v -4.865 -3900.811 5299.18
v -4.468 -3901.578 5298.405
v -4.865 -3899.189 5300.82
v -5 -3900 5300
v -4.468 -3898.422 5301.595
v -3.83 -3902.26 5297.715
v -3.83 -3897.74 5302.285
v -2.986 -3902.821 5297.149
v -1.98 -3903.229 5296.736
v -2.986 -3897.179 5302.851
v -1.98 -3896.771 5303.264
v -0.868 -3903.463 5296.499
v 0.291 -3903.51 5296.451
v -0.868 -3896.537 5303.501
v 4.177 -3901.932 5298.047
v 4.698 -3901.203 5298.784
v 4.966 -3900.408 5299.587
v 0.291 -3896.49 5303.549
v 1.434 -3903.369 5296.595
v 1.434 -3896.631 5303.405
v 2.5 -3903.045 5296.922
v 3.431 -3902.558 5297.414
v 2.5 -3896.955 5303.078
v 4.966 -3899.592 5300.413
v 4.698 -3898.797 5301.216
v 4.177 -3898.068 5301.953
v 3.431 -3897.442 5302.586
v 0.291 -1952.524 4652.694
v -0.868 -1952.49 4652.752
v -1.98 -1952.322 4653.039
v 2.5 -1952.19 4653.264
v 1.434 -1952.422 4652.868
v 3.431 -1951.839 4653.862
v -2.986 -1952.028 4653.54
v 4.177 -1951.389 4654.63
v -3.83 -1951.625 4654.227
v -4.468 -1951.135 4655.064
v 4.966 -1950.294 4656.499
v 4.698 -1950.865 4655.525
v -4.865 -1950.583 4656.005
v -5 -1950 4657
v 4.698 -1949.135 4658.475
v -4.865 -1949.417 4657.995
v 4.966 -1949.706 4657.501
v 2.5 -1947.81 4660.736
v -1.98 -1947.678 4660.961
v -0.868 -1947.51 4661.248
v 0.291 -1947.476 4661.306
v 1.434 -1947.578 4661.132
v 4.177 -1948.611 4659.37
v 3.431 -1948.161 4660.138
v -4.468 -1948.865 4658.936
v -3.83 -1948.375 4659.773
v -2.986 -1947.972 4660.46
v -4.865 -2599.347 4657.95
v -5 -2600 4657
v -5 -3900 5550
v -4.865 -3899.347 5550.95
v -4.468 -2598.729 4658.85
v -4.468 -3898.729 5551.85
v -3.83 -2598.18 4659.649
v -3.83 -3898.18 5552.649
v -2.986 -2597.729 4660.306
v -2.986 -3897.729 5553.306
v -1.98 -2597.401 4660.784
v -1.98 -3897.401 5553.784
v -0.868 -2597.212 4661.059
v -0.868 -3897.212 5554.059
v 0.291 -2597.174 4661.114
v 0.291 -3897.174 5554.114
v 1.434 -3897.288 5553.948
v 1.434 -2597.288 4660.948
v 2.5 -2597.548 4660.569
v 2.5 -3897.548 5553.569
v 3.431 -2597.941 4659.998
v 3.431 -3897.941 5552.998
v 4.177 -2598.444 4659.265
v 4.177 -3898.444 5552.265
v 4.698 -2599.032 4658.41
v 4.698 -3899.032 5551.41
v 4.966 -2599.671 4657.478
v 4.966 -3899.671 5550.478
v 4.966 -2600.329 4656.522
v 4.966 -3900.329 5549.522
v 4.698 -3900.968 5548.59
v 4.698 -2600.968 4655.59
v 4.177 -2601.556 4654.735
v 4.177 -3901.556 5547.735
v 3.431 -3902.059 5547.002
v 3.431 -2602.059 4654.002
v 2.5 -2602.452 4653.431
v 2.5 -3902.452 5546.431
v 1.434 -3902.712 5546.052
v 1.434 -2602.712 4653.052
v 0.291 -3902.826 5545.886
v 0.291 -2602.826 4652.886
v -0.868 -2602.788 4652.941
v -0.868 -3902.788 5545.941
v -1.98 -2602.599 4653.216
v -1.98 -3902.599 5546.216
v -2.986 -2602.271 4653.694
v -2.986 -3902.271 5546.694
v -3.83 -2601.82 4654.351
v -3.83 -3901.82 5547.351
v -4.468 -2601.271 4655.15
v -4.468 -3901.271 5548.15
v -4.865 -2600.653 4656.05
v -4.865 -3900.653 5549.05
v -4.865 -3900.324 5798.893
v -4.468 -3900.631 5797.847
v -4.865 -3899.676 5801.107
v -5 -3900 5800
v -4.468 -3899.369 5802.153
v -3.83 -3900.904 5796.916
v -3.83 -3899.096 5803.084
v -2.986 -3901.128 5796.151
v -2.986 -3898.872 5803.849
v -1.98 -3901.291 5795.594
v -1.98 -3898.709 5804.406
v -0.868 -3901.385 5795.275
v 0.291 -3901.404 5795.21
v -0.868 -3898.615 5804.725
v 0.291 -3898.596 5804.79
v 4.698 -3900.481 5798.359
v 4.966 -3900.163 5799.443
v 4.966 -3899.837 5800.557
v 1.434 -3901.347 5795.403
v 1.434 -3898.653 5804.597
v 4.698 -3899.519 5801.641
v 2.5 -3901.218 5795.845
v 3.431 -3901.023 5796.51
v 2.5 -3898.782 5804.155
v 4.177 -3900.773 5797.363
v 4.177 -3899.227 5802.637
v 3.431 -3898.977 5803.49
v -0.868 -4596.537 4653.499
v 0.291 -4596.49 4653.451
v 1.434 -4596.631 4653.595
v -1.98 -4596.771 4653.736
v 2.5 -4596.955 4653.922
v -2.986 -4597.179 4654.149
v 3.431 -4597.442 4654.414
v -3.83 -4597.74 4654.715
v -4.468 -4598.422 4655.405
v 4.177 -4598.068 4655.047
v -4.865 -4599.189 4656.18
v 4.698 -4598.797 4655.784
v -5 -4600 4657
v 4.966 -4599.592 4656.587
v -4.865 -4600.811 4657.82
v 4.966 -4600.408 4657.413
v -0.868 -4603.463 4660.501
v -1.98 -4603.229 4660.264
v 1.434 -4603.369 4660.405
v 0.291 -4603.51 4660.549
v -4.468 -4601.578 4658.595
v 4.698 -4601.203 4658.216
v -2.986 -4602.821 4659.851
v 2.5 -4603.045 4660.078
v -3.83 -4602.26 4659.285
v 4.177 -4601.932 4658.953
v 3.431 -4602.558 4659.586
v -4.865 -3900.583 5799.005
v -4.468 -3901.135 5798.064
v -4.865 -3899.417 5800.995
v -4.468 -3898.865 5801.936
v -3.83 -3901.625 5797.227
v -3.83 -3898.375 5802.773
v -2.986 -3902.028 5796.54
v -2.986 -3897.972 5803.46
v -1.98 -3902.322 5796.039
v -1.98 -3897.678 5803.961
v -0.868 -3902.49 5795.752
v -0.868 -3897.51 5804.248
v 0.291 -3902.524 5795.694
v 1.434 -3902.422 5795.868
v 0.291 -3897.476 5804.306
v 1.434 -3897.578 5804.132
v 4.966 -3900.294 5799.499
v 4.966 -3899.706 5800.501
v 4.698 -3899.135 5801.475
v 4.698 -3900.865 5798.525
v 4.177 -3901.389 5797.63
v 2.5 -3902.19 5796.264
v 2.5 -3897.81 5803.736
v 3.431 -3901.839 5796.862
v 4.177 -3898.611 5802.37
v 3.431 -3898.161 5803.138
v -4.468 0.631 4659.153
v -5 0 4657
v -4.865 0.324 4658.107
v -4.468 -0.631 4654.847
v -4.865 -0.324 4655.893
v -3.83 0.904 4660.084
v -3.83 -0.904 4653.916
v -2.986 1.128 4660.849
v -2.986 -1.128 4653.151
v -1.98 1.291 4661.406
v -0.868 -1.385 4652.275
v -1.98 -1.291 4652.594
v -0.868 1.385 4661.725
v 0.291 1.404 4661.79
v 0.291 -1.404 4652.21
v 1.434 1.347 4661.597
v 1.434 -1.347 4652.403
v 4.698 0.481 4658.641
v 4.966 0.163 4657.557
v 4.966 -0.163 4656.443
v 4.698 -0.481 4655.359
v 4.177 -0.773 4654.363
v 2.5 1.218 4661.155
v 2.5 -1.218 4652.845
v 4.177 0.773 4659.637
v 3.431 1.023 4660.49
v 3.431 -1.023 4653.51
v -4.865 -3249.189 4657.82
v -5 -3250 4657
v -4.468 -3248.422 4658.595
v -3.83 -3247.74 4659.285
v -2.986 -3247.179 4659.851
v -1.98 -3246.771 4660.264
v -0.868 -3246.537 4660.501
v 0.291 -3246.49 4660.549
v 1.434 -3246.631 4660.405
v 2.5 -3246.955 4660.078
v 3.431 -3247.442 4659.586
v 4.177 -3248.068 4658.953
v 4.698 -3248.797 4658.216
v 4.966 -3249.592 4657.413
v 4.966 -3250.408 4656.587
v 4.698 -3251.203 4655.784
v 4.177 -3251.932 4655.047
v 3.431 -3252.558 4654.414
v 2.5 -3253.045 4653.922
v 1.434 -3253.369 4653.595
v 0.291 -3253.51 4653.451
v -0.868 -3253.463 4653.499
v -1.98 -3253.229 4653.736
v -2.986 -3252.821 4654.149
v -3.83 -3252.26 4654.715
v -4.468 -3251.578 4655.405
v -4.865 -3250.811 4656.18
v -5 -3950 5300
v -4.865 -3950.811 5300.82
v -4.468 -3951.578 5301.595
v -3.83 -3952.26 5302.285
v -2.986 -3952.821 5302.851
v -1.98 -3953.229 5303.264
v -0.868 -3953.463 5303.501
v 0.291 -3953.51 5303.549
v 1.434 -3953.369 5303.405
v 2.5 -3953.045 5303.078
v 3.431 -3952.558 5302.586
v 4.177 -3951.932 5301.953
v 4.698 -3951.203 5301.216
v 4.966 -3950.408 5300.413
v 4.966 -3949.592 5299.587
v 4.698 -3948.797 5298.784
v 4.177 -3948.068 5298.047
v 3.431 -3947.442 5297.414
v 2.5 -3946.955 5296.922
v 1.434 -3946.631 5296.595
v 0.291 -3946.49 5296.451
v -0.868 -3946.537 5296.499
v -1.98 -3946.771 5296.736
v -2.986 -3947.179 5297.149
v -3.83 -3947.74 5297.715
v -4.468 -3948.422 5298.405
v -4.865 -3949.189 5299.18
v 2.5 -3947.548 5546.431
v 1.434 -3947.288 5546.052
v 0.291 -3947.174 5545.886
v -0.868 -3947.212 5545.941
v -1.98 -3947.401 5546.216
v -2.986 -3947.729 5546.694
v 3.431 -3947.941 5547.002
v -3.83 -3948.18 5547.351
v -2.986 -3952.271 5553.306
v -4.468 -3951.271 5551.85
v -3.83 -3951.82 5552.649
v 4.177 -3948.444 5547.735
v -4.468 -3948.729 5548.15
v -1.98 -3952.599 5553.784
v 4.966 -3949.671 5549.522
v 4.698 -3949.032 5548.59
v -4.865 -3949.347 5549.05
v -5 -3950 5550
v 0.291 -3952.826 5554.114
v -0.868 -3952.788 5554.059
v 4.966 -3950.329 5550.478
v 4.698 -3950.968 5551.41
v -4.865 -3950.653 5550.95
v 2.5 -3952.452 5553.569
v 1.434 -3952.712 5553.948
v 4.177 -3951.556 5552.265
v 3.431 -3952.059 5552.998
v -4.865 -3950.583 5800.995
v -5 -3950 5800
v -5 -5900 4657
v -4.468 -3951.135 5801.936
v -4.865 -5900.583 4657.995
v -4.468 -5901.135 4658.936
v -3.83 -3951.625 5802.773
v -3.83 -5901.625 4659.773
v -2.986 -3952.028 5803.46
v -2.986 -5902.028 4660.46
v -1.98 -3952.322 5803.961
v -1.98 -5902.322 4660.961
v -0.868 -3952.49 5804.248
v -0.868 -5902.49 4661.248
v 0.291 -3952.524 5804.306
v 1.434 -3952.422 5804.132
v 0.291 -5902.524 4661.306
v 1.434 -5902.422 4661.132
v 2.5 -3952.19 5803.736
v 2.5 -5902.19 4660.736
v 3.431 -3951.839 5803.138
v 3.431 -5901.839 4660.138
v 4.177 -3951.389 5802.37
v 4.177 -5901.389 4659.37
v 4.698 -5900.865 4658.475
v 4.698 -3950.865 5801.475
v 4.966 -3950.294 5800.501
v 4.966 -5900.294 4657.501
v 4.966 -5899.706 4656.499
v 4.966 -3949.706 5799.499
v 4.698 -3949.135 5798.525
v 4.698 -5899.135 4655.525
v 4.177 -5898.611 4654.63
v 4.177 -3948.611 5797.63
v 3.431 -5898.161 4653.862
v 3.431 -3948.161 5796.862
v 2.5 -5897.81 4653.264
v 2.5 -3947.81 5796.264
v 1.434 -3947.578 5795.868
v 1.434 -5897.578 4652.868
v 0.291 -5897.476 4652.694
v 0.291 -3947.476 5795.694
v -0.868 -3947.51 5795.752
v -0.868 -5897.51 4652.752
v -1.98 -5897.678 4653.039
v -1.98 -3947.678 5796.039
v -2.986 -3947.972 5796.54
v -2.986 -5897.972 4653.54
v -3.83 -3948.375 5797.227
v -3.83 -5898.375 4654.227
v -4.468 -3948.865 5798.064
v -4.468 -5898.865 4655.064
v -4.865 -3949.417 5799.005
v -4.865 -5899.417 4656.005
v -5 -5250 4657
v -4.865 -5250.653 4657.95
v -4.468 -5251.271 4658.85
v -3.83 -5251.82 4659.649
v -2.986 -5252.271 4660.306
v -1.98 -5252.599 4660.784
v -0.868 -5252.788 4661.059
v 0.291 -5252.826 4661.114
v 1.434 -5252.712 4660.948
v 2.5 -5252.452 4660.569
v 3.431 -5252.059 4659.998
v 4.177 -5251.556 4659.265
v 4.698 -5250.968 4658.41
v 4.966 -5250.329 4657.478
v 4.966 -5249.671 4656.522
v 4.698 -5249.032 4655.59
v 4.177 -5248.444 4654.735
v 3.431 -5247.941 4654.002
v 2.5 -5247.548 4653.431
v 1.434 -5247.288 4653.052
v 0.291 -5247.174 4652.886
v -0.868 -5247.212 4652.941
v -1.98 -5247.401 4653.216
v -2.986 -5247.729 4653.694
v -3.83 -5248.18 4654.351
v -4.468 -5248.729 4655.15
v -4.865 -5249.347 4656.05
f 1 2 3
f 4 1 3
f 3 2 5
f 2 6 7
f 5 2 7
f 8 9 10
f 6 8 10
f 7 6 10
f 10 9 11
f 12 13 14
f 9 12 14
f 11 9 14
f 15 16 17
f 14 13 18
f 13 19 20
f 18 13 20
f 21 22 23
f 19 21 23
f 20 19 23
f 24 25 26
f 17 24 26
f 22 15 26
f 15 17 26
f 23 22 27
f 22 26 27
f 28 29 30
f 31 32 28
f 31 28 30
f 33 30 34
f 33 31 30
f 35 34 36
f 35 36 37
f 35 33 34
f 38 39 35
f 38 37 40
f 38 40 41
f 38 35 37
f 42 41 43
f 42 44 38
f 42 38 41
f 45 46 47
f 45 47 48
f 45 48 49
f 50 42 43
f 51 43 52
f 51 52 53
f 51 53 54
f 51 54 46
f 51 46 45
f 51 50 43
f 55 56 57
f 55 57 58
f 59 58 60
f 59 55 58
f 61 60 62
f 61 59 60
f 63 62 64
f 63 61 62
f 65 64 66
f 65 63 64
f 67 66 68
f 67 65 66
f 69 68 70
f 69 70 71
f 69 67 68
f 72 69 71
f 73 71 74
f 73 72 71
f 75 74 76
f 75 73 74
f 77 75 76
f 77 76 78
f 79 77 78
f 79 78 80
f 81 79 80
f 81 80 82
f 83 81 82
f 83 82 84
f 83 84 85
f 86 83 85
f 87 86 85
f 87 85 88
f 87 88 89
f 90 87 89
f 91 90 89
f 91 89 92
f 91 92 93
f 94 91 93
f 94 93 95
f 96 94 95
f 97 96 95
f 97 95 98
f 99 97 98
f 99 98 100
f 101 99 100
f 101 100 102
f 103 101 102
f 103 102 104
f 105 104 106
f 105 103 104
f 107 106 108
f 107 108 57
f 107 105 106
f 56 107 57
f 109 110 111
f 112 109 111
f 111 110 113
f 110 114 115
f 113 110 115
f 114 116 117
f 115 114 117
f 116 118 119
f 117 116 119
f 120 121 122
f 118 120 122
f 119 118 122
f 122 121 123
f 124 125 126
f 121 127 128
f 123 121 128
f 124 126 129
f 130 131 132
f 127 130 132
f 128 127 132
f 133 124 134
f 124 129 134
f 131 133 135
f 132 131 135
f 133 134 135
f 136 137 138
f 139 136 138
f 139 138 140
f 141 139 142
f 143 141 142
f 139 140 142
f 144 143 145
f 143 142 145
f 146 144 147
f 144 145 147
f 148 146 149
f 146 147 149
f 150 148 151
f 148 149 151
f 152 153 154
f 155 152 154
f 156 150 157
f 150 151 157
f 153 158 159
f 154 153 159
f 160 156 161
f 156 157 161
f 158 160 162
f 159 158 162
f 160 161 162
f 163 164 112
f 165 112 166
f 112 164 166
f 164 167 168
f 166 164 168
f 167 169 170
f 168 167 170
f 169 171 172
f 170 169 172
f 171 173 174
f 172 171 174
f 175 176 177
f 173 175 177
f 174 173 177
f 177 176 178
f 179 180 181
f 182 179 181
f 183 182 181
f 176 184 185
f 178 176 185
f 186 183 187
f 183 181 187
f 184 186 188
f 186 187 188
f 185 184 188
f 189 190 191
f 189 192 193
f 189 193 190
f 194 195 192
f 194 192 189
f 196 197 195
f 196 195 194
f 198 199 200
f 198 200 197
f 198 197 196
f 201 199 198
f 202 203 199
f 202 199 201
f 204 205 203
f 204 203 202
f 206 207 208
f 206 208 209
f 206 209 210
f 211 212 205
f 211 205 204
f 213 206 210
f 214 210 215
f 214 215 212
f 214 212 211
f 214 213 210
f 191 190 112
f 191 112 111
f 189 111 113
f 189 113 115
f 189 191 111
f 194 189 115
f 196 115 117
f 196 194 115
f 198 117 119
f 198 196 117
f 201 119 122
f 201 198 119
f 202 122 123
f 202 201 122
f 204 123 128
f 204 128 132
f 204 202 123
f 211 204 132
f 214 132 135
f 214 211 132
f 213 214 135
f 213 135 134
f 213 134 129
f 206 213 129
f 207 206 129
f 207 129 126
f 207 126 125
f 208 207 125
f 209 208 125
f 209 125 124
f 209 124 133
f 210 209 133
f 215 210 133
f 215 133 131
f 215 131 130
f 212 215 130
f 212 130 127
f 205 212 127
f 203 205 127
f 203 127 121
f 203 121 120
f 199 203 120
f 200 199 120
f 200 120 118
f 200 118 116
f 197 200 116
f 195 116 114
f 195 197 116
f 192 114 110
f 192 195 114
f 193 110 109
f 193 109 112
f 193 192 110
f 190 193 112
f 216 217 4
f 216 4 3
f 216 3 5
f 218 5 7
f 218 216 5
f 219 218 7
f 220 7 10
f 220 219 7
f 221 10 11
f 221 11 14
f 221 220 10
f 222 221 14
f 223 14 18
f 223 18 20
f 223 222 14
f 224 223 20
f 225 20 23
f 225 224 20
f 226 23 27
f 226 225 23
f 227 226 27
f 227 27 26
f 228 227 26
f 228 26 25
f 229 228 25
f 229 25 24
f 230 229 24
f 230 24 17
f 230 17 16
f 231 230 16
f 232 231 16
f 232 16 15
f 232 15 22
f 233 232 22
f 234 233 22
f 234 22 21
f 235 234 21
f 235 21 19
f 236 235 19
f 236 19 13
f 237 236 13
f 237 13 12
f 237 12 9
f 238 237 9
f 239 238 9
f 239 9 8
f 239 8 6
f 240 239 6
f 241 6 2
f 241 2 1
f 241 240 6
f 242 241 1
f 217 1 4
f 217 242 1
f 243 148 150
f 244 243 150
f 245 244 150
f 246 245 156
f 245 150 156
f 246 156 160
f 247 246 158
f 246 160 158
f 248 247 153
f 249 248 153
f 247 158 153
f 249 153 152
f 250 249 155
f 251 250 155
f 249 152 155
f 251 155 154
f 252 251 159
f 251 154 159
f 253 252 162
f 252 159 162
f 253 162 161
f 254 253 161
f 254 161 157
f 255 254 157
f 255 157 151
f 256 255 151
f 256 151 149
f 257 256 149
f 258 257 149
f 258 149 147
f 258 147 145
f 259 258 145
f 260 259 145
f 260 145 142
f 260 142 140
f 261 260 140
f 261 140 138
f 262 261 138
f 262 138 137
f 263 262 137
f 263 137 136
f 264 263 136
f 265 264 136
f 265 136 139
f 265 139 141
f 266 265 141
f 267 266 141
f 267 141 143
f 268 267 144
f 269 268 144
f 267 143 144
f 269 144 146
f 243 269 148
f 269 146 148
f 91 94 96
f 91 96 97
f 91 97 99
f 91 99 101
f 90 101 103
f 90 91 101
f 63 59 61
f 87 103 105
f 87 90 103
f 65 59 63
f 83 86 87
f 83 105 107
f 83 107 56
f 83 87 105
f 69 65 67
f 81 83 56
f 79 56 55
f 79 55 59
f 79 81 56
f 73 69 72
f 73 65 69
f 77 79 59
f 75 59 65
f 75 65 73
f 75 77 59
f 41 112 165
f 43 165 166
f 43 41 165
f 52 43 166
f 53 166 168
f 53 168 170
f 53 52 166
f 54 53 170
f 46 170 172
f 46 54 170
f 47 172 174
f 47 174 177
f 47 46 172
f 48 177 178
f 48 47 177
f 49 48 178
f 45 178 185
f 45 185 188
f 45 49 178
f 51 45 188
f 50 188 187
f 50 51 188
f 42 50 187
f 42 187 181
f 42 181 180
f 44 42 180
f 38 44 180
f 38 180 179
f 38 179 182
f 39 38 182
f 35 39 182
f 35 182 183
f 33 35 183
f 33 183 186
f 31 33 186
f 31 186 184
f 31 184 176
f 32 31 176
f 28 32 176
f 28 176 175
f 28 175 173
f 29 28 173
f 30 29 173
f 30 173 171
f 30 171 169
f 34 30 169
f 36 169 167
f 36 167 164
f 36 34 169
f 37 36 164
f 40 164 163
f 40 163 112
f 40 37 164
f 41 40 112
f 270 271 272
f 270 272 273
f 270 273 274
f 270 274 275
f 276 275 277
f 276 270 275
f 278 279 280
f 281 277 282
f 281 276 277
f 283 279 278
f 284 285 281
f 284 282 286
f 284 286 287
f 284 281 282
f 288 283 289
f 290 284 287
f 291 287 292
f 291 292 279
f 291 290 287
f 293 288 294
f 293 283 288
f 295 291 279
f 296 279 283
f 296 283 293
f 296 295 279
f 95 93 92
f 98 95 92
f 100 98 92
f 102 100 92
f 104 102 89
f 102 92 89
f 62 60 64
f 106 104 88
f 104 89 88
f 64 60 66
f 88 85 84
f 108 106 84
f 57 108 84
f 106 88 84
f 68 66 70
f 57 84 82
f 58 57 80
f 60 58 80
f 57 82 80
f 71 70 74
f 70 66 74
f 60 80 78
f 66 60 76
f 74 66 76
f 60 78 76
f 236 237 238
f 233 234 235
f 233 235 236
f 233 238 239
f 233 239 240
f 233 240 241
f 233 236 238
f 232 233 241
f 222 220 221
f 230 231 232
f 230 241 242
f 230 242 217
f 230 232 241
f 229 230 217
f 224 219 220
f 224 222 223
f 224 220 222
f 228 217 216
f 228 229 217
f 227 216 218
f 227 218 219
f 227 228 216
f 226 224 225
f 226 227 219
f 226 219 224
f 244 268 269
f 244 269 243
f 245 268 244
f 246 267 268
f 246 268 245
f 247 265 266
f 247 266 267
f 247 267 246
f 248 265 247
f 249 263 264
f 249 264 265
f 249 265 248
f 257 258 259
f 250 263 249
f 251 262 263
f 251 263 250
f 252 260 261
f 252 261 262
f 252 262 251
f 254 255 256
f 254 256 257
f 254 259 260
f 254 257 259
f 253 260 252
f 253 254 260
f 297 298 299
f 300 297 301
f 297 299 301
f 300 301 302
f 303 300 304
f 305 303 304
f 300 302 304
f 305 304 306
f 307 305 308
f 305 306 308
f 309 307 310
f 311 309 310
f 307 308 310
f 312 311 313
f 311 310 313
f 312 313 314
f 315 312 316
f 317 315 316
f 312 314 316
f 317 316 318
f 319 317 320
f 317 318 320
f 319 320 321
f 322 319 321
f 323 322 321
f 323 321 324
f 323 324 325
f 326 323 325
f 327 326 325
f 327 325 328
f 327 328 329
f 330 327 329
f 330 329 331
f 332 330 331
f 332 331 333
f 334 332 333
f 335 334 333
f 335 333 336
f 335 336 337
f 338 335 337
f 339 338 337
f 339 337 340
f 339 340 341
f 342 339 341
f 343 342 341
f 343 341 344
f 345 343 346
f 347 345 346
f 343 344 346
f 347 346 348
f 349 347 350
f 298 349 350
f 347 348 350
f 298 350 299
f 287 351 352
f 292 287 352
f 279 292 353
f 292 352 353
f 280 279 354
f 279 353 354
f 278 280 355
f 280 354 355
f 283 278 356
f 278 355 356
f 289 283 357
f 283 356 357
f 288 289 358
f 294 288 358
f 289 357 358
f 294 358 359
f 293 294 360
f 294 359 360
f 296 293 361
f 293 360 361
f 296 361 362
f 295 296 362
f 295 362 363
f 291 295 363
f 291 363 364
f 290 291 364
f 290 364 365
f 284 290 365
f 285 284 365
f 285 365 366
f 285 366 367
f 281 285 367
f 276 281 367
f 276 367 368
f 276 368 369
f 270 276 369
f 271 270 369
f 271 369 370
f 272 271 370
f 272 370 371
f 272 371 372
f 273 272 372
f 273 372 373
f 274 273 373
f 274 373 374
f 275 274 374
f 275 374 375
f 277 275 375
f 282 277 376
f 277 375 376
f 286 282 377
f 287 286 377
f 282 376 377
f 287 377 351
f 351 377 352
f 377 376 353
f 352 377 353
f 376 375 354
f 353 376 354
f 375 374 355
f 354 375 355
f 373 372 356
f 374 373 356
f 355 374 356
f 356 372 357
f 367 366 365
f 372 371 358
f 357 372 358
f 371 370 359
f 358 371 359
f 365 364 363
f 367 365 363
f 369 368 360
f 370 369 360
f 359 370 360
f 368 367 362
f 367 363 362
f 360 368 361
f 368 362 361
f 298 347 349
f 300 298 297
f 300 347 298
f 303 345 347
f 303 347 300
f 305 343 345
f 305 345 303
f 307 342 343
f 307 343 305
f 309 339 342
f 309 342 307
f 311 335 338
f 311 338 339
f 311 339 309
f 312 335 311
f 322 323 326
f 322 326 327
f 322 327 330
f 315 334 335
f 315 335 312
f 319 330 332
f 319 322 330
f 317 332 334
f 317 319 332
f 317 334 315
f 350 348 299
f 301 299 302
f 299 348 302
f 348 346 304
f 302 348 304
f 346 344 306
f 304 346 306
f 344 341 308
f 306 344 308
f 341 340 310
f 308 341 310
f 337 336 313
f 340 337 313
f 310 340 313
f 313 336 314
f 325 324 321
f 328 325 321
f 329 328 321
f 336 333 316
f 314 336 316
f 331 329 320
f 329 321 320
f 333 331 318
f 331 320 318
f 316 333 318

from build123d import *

# Parameters (mm, degrees)
F9_R  = 5
F12_R = 5
F15_R = 5
F18_R = 5


with BuildPart() as f10:
    # F10: sweep along a path in F7
    with BuildLine(Plane(origin=(0, 0, 0), x_dir=(0, -1, 0), z_dir=(-1, 0, 0))) as f10_path:
        Line((3900, 5800), (1950, 4657))
    # F9 (on line) → F10 (sweep)
    with BuildSketch(Plane(origin=(0, -5433.0313338419, 3184.5922126058), x_dir=(-1, 0, 0), z_dir=(0, 0.862717937, -0.5056854369))):
        with Locations((0, 3031.5908307196)):
            Circle(F9_R)
    sweep(path=f10_path.line)


with BuildPart() as f13:
    # F13: sweep along a path in F7
    with BuildLine(Plane(origin=(0, 0, 0), x_dir=(0, -1, 0), z_dir=(-1, 0, 0))) as f13_path:
        Line((3900, 5800), (0, 4657))
    # F12 (on line) → F13 (sweep)
    with BuildSketch(Plane(origin=(0, -5156.8990404657, 1511.368103398), x_dir=(-1, 0, 0), z_dir=(0, 0.9596354142, -0.2812469945))):
        with Locations((0, 4469.0221237398)):
            Circle(F12_R)
    sweep(path=f13_path.line)


with BuildPart() as f16:
    # F16: sweep along a path in F7
    with BuildLine(Plane(origin=(0, 0, 0), x_dir=(0, -1, 0), z_dir=(-1, 0, 0))) as f16_path:
        Line((3900, 5550), (2600, 4657))
    # F15 (on line) → F16 (sweep)
    with BuildSketch(Plane(origin=(0, -5239.9044161307, 3599.4112643113), x_dir=(-1, 0, 0), z_dir=(0, 0.8242638622, -0.5662058684))):
        with Locations((0, 2366.4615484225)):
            Circle(F15_R)
    sweep(path=f16_path.line)


with BuildPart() as f19:
    # F19: sweep along a path in F7
    with BuildLine(Plane(origin=(0, 0, 0), x_dir=(0, -1, 0), z_dir=(-1, 0, 0))) as f19_path:
        Line((3900, 5300), (3250, 4657))
    # F18 (on line) → F19 (sweep)
    with BuildSketch(Plane(origin=(0, -4620.9577378524, 4571.1935775986), x_dir=(-1, 0, 0), z_dir=(0, 0.710924474, -0.7032683643))):
        with Locations((0, 1025.1530915443)):
            Circle(F18_R)
    sweep(path=f19_path.line)


with BuildPart() as f21_1:
    # F21: instance of F19
    add(f19.part.mirror(Plane.XZ.offset(3925)))


with BuildPart() as f21_2:
    # F21: instance of F16
    add(f16.part.mirror(Plane.XZ.offset(3925)))


with BuildPart() as f21_3:
    # F21: instance of F10
    add(f10.part.mirror(Plane.XZ.offset(3925)))


solid = Compound([f10.part, f13.part, f16.part, f19.part, f21_1.part, f21_2.part, f21_3.part])
